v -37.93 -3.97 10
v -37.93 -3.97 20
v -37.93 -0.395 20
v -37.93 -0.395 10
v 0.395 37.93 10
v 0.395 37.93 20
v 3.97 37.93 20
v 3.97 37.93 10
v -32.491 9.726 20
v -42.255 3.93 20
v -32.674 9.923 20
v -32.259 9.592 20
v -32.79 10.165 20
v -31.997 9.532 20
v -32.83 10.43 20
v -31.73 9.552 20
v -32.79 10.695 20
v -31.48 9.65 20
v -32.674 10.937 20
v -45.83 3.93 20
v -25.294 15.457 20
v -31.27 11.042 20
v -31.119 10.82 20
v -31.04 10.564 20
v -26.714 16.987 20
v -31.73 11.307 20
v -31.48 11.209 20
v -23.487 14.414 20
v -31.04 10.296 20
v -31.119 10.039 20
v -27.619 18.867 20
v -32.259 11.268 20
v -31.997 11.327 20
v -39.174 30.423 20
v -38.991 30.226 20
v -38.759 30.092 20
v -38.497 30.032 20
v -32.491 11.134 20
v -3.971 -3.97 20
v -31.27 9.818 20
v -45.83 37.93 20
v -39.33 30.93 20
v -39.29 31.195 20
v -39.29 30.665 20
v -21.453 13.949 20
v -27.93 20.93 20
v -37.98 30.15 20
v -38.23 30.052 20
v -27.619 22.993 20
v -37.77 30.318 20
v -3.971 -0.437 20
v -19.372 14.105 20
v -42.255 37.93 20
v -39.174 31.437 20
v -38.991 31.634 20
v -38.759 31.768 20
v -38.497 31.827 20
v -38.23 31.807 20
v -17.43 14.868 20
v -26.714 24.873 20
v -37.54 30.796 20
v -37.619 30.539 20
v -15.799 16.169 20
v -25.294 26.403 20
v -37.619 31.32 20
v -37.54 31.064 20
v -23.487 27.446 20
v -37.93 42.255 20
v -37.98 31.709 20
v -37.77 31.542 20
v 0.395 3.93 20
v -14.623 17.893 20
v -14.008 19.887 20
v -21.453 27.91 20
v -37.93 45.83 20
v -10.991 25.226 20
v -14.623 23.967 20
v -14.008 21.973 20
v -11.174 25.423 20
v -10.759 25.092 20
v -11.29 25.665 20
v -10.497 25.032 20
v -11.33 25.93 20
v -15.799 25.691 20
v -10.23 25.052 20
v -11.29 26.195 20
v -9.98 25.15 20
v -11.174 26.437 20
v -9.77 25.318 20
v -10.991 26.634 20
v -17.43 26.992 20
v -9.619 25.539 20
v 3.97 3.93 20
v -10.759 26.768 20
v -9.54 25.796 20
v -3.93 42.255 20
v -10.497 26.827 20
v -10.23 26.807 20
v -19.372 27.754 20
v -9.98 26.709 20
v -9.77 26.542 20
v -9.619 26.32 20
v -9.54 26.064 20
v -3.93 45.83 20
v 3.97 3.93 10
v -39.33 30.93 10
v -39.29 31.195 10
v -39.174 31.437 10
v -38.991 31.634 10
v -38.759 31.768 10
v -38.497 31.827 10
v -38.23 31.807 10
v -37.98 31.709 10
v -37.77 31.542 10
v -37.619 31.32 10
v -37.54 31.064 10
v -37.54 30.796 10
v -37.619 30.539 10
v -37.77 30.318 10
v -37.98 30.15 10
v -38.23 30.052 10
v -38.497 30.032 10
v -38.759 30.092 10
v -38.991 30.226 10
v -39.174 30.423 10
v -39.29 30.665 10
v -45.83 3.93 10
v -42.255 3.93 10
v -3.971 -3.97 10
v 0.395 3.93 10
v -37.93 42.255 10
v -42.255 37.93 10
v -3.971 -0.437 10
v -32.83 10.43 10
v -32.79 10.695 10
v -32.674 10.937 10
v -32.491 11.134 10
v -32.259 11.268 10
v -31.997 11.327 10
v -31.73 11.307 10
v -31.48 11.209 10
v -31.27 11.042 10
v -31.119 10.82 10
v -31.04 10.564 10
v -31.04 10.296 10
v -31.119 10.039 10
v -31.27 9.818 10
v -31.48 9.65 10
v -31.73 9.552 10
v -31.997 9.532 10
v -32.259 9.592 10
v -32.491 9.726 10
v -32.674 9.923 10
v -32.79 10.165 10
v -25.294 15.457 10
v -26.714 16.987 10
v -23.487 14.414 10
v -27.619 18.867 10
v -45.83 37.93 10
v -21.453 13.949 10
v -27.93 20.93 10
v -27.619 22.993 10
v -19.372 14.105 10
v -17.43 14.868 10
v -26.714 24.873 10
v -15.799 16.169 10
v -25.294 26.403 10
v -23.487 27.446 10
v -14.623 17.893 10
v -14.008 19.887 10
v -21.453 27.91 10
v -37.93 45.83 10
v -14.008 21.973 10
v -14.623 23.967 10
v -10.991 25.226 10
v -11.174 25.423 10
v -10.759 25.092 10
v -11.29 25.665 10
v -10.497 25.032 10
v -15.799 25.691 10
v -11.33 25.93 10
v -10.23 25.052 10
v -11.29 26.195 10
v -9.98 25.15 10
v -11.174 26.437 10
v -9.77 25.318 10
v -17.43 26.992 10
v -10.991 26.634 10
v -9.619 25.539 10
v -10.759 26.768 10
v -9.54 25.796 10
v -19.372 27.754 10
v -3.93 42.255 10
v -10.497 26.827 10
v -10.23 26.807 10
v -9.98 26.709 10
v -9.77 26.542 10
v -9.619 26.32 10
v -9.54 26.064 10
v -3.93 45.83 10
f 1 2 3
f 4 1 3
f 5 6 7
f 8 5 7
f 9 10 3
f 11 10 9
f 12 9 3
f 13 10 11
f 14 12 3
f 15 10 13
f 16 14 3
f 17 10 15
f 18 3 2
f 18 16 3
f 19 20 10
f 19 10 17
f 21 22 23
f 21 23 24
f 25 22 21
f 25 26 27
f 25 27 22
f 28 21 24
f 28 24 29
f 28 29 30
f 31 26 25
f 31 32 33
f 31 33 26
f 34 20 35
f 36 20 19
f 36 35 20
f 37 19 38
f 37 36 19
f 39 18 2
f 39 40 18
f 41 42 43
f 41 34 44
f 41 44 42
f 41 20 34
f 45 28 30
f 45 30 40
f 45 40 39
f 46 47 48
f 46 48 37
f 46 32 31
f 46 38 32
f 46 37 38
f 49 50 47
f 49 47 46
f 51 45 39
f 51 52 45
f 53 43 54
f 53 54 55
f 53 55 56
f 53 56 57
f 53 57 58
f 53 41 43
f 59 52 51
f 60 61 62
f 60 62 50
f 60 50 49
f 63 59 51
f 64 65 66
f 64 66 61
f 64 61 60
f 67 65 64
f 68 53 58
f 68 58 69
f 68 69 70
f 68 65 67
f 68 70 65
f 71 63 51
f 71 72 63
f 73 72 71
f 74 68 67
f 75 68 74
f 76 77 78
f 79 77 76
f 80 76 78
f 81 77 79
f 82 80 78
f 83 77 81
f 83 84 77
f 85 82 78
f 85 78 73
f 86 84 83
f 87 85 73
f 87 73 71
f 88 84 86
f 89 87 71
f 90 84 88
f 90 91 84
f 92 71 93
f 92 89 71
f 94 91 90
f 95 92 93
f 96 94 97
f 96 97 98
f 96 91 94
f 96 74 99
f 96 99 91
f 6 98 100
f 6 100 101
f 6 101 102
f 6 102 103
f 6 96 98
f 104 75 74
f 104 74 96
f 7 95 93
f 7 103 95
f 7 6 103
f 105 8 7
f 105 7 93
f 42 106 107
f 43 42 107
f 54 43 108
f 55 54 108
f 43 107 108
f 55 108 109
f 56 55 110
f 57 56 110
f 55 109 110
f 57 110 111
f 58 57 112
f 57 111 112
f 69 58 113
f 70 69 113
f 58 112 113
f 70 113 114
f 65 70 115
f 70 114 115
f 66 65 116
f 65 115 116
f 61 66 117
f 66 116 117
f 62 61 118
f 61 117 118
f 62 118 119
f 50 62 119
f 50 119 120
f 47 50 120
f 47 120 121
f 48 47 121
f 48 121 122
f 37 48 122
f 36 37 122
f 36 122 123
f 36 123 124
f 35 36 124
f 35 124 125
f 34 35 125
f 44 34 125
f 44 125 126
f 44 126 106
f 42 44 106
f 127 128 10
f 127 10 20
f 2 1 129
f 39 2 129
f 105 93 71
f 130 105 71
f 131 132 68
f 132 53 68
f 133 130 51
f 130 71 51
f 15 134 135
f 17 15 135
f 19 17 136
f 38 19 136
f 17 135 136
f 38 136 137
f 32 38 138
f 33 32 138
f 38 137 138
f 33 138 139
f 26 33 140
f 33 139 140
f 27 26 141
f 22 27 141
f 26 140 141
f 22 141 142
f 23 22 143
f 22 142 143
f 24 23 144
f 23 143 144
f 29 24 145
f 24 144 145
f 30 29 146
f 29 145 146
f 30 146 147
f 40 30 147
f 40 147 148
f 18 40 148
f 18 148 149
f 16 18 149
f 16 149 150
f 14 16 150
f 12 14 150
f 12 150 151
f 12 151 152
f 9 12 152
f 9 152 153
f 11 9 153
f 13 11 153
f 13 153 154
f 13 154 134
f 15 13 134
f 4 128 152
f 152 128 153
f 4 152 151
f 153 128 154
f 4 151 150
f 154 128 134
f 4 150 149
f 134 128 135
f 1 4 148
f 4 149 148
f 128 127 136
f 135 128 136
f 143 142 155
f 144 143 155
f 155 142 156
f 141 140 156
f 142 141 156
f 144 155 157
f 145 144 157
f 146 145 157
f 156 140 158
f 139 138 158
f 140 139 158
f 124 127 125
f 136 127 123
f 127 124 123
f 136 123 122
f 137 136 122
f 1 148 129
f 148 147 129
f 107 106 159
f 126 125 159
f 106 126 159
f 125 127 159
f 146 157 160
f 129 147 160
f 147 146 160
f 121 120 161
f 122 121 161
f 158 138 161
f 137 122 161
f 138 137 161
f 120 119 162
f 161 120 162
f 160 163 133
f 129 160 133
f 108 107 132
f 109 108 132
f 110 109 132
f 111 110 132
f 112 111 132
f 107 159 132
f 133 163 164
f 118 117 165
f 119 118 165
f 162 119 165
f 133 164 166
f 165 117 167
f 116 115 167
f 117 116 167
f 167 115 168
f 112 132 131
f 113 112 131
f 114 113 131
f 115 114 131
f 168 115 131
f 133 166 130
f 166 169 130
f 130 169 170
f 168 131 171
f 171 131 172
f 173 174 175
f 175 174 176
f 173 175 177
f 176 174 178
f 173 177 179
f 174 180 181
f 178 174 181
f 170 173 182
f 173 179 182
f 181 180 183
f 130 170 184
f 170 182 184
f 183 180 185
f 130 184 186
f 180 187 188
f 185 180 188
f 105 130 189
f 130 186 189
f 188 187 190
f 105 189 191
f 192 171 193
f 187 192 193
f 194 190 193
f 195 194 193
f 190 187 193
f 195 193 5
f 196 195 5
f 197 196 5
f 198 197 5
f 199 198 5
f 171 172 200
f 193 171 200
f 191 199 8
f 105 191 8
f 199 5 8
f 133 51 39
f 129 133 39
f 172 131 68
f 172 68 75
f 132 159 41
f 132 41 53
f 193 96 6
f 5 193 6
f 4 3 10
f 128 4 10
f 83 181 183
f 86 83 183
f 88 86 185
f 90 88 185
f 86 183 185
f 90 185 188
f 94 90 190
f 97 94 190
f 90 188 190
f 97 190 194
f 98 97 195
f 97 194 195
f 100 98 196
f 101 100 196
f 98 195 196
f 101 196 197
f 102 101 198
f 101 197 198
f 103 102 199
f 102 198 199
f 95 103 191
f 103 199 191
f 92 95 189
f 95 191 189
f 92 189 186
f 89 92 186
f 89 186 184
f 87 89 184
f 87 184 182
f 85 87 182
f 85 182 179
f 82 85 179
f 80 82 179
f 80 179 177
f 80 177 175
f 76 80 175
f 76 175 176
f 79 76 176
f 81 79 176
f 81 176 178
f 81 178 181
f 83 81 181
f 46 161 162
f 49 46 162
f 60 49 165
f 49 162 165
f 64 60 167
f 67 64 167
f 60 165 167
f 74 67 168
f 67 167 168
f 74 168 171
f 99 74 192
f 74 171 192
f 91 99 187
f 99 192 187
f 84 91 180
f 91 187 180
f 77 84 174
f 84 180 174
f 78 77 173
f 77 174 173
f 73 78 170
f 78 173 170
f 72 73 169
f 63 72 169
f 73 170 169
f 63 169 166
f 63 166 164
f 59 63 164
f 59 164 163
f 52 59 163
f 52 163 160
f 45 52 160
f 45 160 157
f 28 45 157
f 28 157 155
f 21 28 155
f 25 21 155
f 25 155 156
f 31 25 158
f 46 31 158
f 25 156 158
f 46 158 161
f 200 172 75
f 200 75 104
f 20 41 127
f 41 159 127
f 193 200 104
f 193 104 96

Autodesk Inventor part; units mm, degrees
ref_plane "YZ Plane" through (0, 0, 0) normal (1, 0, 0) x (0, 1, 0)
ref_plane "XZ Plane" through (0, 0, 0) normal (0, 1, 0) x (-1, 0, 0)
ref_plane "Work Plane1" through (0, 0, 10) normal (0, 0, 1) x (1, 0, 0)
sketch "Sketch1" plane through (0, 0, 10) normal (0, 0, 1) x (1, 0, 0)
  line L0 (-4.0299, -0.3538) -> (-2.2322, 1.4439) construction
  arc A0 (-1.4439, 2.2322) -> (-2.2322, 1.4439) centre (-0.9299, 0.9299) ccw construction
  line L1 (-1.4439, 2.2322) -> (0.3538, 4.0299) construction
  line L2 (-37.8299, 42.8299) -> (-37.8299, 37.8299) construction
  line L3 (-37.8299, 37.8299) -> (-42.9208, 37.8299) construction
  line L4 (-37.8299, 42.2137) -> (-37.8299, 45.8299) construction
  line L5 (-37.8299, 45.8299) -> (-4.0299, 45.8299) construction
  line L6 (-4.0299, 45.8299) -> (-4.0299, 42.2137) construction
  line L7 (-4.0299, 4.0299) -> (0.3538, 4.0299) projected
  circle A1 centre (-20.9299, 20.9299) radius 17.5 projected
  line L8 (-20.9299, 58.9723) -> (17.1124, 20.9299) construction
  line L9 (17.1124, 20.9299) -> (-20.9299, -17.1124) construction
  line L10 (-20.9299, -17.1124) -> (-58.9723, 20.9299) construction
  line L11 (-58.9723, 20.9299) -> (-20.9299, 58.9723) construction
  line L12 (-20.9299, 58.9723) -> (-20.9299, -17.1124) construction
  line L13 (17.1124, 20.9299) -> (-58.9723, 20.9299) construction
  line L14 (-20.9299, 58.9723) -> (32.8701, 58.9723) construction
  line L15 (-43.4299, 43.4299) -> (1.5701, 43.4299) construction
  line L16 (1.5701, 43.4299) -> (1.5701, -1.5701) construction
  line L17 (1.5701, -1.5701) -> (-43.4299, -1.5701) construction
  line L18 (-43.4299, -1.5701) -> (-43.4299, 43.4299) construction
  line L19 (-43.4299, 43.4299) -> (1.5701, -1.5701) construction
  line L20 (1.5701, 43.4299) -> (-43.4299, -1.5701) construction
  line L21 (-43.4299, 5.3876) -> (-43.4299, 36.4723)
  line L22 (-43.4299, 36.4723) -> (-36.4723, 43.4299)
  line L23 (-36.4723, 43.4299) -> (-5.3876, 43.4299)
  line L24 (-5.3876, 43.4299) -> (1.5701, 36.4723)
  line L25 (1.5701, 36.4723) -> (1.5701, 5.3876)
  line L26 (1.5701, 5.3876) -> (-5.3876, -1.5701)
  line L27 (-5.3876, -1.5701) -> (-36.4723, -1.5701)
  line L28 (-36.4723, -1.5701) -> (-43.4299, 5.3876)
  line L29 (-4.0299, 42.2137) -> (-37.8299, 42.2137) projected
  line L30 (-4.0299, -0.3538) -> (-4.0299, 4.0299) projected
  circle A2 centre (-20.9299, 20.9299) radius 1.5
  line L31 (-10.9299, 10.9299) -> (-30.9299, 10.9299) construction
  line L32 (-30.9299, 10.9299) -> (-30.9299, 30.9299) construction
  line L33 (-30.9299, 30.9299) -> (-10.9299, 30.9299) construction
  line L34 (-10.9299, 30.9299) -> (-10.9299, 10.9299) construction
  line L35 (-10.9299, 10.9299) -> (-30.9299, 30.9299) construction
  line L36 (-30.9299, 10.9299) -> (-10.9299, 30.9299) construction
  circle A3 centre (-30.9299, 30.9299) radius 1.4
  circle A4 centre (-30.9299, 10.9299) radius 1.4
  circle A5 centre (-10.9299, 10.9299) radius 1.4
  line L37 (-45.8299, 37.8299) -> (-42.0723, 37.8299) construction
  line L38 (-42.1723, 37.7299) -> (-45.8299, 37.7299)
  line L39 (-45.8299, 37.7299) -> (-45.8299, 4.1299)
  line L40 (-45.8299, 4.1299) -> (-42.1723, 4.1299)
  line L41 (-42.1723, 4.1299) -> (-42.1723, 37.7299)
  line L42 (-45.8299, 4.0299) -> (-42.0723, 4.0299) construction
  line L43 (-45.8299, 37.8299) -> (-42.0723, 37.8299) projected
  line L44 (-37.7299, 45.8299) -> (-4.1299, 45.8299)
  line L45 (-4.1299, 45.8299) -> (-4.1299, 42.1723)
  line L46 (-4.1299, 42.1723) -> (-37.7299, 42.1723)
  line L47 (-37.7299, 42.1723) -> (-37.7299, 45.8299)
  line L48 (0.4701, 37.8299) -> (0.4701, 4.0299) construction
  line L49 (0.4701, 4.0299) -> (3.9701, 4.0299) construction
  line L50 (3.9701, 37.8299) -> (3.9701, 4.0299) construction
  line L51 (0.4701, 37.8299) -> (3.9701, 37.8299) construction
  line L52 (-45.8299, -3.9701) -> (-4.0299, -3.9701) construction
  line L53 (0.3124, 37.7299) -> (3.9701, 37.7299)
  line L54 (3.9701, 37.7299) -> (3.9701, 4.1299)
  line L55 (3.9701, 4.1299) -> (0.3124, 4.1299)
  line L56 (0.3124, 4.1299) -> (0.3124, 37.7299)
  line L57 (-4.1713, -0.3538) -> (-37.7299, -0.3538)
  line L58 (-37.7299, -0.3538) -> (-37.7299, -3.9701)
  line L59 (-37.7299, -3.9701) -> (-4.1713, -3.9701)
  line L60 (-4.1713, -3.9701) -> (-4.1713, -0.3538)
  point P0 (-37.8299, 4.0299)
  dimension "d18" = 53.8
  dimension "d19" = 45
  dimension "d20" = 53.8
  dimension "d21" = 45
  dimension "d22" = 45
  dimension "d30" = 20
  dimension "d31" = 20
  dimension "d32" = 2.8
  dimension "d33" = 2.8
  dimension "d34" = 2.8
  dimension "d35" = 3
  dimension "d36" = 0.1
  dimension "d37" = 0.1
  dimension "d38" = 0.1
  dimension "d39" = 0.1
extrude "Extrusion1" add sketch "Sketch1" along normal blind 10 contours L30 L26 L57 L28 L41 L22 L46 L24 L56 L7 | L7 L26 L30 | L56 L24 L25 L26 | L26 L25 L24 L53 L54 L55 | L60 L59 L58 L57 L28 L27 L26 | L26 L27 L28 L57 | L46 L22 L29 L24 | L24 L29 L45 | L40 L39 L38 L22 L21 L28 | L28 L21 L22 L41 | L29 L22 L23 L24 | L24 L23 L22 L29 L47 L44 L45 | L47 L29 L22 | A1 | A2 | A3 | A4 | A5
sketch "Skizze4" plane through (0, 0, 20) normal (0, 0, 1) x (1, 0, 0)
  line L0 (-37.7299, 42.1723) -> (-42.1723, 37.7299) projected
  line L1 (-42.1723, 37.7299) -> (-45.8299, 37.7299) projected
  line L2 (-45.8299, 37.7299) -> (-45.8299, 4.1299) construction
  line L3 (-45.8299, 4.1299) -> (-42.1723, 4.1299) projected
  line L4 (-42.1723, 4.1299) -> (-37.6885, -0.3538) projected
  line L5 (-37.6885, -0.3538) -> (-37.7299, -0.3538) projected
  line L6 (-37.7299, -0.3538) -> (-37.7299, -3.9701) projected
  line L7 (-37.7299, -3.9701) -> (-4.1713, -3.9701) construction
  line L8 (-4.1713, -3.9701) -> (-4.1713, -0.3538) projected
  line L9 (-4.1713, -0.3538) -> (0.3124, 4.1299) projected
  line L10 (0.3124, 4.1299) -> (3.9701, 4.1299) projected
  line L11 (3.9701, 4.1299) -> (3.9701, 37.7299) construction
  line L12 (3.9701, 37.7299) -> (0.3124, 37.7299) projected
  line L13 (0.3124, 37.7299) -> (-4.1299, 42.1723) projected
  line L14 (-4.1299, 42.1723) -> (-4.1299, 45.8299) projected
  line L15 (-4.1299, 45.8299) -> (-37.7299, 45.8299) construction
  line L16 (-37.7299, 45.8299) -> (-37.7299, 42.1723) projected
  line L17 (-37.9299, 46.0299) -> (-3.9299, 46.0299) construction
  line L18 (-3.9299, 46.0299) -> (-3.9299, 42.2551)
  line L19 (-3.9299, 42.2551) -> (0.3953, 37.9299)
  line L20 (0.3953, 37.9299) -> (4.1701, 37.9299)
  line L21 (4.1701, 37.9299) -> (4.1701, 3.9299) construction
  line L22 (4.1701, 3.9299) -> (0.3953, 3.9299)
  line L23 (0.3953, 3.9299) -> (-3.9713, -0.4367)
  line L24 (-3.9713, -0.4367) -> (-3.9713, -4.1701)
  line L25 (-3.9713, -4.1701) -> (-37.9299, -4.1701) construction
  line L26 (-37.9299, -4.1701) -> (-37.9299, -0.3953)
  line L27 (-37.9299, -0.3953) -> (-42.2551, 3.9299)
  line L28 (-42.2551, 3.9299) -> (-46.0299, 3.9299)
  line L29 (-46.0299, 3.9299) -> (-46.0299, 37.9299) construction
  line L30 (-46.0299, 37.9299) -> (-42.2551, 37.9299)
  line L31 (-42.2551, 37.9299) -> (-37.9299, 42.2551)
  line L32 (-37.9299, 42.2551) -> (-37.9299, 46.0299)
  line L33 (-45.8299, 37.7299) -> (-45.8299, 37.9299)
  line L34 (-4.1299, 45.8299) -> (-37.7299, 45.8299) projected
  line L35 (-37.7299, 45.8299) -> (-37.9299, 45.8299)
  line L36 (-4.1299, 45.8299) -> (-3.9299, 45.8299)
  line L37 (3.9701, 37.7299) -> (3.9701, 37.9299)
  line L38 (3.9701, 4.1299) -> (3.9701, 37.7299) projected
  line L39 (3.9701, 4.1299) -> (3.9701, 3.9299)
  line L40 (-4.1713, -3.9701) -> (-3.9713, -3.9701)
  line L41 (-37.7299, -3.9701) -> (-37.9299, -3.9701)
  line L42 (-45.8299, 4.1299) -> (-45.8299, 3.9299)
  point P0 (0, 0)
  dimension "d40" = 0.2
extrude "IM_offset" add sketch "Skizze4" against normal up to surface (10 mm away)
sketch "Sketch25" plane through (0, 0, 10) normal (0, 0, -1) x (-1, 0, 0)
  line L0 (3.9713, -3.9701) -> (37.9299, -3.9701) projected
  line L1 (37.9299, -3.9701) -> (37.9299, -0.3953) projected
  line L2 (37.9299, -0.3953) -> (42.2551, 3.9299) projected
  line L3 (42.2551, 3.9299) -> (45.8299, 3.9299) projected
  line L4 (45.8299, 3.9299) -> (45.8299, 37.9299) projected
  line L5 (45.8299, 37.9299) -> (42.2551, 37.9299) projected
  line L6 (42.2551, 37.9299) -> (37.9299, 42.2551) projected
  line L7 (37.9299, 42.2551) -> (37.9299, 45.8299) projected
  line L8 (37.9299, 45.8299) -> (3.9299, 45.8299) projected
  line L9 (3.9299, 45.8299) -> (3.9299, 42.2551) projected
  line L10 (3.9299, 42.2551) -> (-0.3953, 37.9299) projected
  line L11 (-0.3953, 37.9299) -> (-3.9701, 37.9299) projected
  line L12 (-3.9701, 37.9299) -> (-3.9701, 3.9299) projected
  line L13 (-3.9701, 3.9299) -> (-0.3953, 3.9299) projected
  line L14 (-0.3953, 3.9299) -> (3.9713, -0.4367) projected
  line L15 (3.9713, -0.4367) -> (3.9713, -3.9701) projected
  circle A0 centre (20.9299, 20.9299) radius 24.9
  circle A1 centre (20.9299, 20.9299) radius 7
  dimension "d167" = 14
extrude "Extrusion21" cut sketch "Sketch25" against normal through all contours A1
sketch "Sketch29" plane through (0, 0, 10) normal (0, 0, -1) x (-1, 0, 0)
  circle A0 centre (38.4299, 30.9299) radius 1
  circle A1 centre (31.9299, 10.4299) radius 1
  circle A2 centre (10.4299, 25.9299) radius 1
  circle A3 centre (31.9299, 10.4299) radius 0.9
  circle A4 centre (38.4299, 30.9299) radius 0.9
  circle A5 centre (10.4299, 25.9299) radius 0.9
  point P0 (0, 0)
  dimension "d171" = 1.8
  dimension "d172" = 1.8
  dimension "d173" = 1.8
extrude "Extrusion23" cut sketch "Sketch29" against normal blind 10 contours A3 | A4 | A5
ref_plane "Arbeitsebene5" through (-37.9299, 20.9299, 10) normal (0, 1, 0) x (1, 0, 0)
ref_plane "Arbeitsebene6" through (-20.9299, 3.9299, 10) normal (1, 0, 0) x (0, 0, -1)
properties part number "20_Cube_Insert_Fiber_STMount_Center"
